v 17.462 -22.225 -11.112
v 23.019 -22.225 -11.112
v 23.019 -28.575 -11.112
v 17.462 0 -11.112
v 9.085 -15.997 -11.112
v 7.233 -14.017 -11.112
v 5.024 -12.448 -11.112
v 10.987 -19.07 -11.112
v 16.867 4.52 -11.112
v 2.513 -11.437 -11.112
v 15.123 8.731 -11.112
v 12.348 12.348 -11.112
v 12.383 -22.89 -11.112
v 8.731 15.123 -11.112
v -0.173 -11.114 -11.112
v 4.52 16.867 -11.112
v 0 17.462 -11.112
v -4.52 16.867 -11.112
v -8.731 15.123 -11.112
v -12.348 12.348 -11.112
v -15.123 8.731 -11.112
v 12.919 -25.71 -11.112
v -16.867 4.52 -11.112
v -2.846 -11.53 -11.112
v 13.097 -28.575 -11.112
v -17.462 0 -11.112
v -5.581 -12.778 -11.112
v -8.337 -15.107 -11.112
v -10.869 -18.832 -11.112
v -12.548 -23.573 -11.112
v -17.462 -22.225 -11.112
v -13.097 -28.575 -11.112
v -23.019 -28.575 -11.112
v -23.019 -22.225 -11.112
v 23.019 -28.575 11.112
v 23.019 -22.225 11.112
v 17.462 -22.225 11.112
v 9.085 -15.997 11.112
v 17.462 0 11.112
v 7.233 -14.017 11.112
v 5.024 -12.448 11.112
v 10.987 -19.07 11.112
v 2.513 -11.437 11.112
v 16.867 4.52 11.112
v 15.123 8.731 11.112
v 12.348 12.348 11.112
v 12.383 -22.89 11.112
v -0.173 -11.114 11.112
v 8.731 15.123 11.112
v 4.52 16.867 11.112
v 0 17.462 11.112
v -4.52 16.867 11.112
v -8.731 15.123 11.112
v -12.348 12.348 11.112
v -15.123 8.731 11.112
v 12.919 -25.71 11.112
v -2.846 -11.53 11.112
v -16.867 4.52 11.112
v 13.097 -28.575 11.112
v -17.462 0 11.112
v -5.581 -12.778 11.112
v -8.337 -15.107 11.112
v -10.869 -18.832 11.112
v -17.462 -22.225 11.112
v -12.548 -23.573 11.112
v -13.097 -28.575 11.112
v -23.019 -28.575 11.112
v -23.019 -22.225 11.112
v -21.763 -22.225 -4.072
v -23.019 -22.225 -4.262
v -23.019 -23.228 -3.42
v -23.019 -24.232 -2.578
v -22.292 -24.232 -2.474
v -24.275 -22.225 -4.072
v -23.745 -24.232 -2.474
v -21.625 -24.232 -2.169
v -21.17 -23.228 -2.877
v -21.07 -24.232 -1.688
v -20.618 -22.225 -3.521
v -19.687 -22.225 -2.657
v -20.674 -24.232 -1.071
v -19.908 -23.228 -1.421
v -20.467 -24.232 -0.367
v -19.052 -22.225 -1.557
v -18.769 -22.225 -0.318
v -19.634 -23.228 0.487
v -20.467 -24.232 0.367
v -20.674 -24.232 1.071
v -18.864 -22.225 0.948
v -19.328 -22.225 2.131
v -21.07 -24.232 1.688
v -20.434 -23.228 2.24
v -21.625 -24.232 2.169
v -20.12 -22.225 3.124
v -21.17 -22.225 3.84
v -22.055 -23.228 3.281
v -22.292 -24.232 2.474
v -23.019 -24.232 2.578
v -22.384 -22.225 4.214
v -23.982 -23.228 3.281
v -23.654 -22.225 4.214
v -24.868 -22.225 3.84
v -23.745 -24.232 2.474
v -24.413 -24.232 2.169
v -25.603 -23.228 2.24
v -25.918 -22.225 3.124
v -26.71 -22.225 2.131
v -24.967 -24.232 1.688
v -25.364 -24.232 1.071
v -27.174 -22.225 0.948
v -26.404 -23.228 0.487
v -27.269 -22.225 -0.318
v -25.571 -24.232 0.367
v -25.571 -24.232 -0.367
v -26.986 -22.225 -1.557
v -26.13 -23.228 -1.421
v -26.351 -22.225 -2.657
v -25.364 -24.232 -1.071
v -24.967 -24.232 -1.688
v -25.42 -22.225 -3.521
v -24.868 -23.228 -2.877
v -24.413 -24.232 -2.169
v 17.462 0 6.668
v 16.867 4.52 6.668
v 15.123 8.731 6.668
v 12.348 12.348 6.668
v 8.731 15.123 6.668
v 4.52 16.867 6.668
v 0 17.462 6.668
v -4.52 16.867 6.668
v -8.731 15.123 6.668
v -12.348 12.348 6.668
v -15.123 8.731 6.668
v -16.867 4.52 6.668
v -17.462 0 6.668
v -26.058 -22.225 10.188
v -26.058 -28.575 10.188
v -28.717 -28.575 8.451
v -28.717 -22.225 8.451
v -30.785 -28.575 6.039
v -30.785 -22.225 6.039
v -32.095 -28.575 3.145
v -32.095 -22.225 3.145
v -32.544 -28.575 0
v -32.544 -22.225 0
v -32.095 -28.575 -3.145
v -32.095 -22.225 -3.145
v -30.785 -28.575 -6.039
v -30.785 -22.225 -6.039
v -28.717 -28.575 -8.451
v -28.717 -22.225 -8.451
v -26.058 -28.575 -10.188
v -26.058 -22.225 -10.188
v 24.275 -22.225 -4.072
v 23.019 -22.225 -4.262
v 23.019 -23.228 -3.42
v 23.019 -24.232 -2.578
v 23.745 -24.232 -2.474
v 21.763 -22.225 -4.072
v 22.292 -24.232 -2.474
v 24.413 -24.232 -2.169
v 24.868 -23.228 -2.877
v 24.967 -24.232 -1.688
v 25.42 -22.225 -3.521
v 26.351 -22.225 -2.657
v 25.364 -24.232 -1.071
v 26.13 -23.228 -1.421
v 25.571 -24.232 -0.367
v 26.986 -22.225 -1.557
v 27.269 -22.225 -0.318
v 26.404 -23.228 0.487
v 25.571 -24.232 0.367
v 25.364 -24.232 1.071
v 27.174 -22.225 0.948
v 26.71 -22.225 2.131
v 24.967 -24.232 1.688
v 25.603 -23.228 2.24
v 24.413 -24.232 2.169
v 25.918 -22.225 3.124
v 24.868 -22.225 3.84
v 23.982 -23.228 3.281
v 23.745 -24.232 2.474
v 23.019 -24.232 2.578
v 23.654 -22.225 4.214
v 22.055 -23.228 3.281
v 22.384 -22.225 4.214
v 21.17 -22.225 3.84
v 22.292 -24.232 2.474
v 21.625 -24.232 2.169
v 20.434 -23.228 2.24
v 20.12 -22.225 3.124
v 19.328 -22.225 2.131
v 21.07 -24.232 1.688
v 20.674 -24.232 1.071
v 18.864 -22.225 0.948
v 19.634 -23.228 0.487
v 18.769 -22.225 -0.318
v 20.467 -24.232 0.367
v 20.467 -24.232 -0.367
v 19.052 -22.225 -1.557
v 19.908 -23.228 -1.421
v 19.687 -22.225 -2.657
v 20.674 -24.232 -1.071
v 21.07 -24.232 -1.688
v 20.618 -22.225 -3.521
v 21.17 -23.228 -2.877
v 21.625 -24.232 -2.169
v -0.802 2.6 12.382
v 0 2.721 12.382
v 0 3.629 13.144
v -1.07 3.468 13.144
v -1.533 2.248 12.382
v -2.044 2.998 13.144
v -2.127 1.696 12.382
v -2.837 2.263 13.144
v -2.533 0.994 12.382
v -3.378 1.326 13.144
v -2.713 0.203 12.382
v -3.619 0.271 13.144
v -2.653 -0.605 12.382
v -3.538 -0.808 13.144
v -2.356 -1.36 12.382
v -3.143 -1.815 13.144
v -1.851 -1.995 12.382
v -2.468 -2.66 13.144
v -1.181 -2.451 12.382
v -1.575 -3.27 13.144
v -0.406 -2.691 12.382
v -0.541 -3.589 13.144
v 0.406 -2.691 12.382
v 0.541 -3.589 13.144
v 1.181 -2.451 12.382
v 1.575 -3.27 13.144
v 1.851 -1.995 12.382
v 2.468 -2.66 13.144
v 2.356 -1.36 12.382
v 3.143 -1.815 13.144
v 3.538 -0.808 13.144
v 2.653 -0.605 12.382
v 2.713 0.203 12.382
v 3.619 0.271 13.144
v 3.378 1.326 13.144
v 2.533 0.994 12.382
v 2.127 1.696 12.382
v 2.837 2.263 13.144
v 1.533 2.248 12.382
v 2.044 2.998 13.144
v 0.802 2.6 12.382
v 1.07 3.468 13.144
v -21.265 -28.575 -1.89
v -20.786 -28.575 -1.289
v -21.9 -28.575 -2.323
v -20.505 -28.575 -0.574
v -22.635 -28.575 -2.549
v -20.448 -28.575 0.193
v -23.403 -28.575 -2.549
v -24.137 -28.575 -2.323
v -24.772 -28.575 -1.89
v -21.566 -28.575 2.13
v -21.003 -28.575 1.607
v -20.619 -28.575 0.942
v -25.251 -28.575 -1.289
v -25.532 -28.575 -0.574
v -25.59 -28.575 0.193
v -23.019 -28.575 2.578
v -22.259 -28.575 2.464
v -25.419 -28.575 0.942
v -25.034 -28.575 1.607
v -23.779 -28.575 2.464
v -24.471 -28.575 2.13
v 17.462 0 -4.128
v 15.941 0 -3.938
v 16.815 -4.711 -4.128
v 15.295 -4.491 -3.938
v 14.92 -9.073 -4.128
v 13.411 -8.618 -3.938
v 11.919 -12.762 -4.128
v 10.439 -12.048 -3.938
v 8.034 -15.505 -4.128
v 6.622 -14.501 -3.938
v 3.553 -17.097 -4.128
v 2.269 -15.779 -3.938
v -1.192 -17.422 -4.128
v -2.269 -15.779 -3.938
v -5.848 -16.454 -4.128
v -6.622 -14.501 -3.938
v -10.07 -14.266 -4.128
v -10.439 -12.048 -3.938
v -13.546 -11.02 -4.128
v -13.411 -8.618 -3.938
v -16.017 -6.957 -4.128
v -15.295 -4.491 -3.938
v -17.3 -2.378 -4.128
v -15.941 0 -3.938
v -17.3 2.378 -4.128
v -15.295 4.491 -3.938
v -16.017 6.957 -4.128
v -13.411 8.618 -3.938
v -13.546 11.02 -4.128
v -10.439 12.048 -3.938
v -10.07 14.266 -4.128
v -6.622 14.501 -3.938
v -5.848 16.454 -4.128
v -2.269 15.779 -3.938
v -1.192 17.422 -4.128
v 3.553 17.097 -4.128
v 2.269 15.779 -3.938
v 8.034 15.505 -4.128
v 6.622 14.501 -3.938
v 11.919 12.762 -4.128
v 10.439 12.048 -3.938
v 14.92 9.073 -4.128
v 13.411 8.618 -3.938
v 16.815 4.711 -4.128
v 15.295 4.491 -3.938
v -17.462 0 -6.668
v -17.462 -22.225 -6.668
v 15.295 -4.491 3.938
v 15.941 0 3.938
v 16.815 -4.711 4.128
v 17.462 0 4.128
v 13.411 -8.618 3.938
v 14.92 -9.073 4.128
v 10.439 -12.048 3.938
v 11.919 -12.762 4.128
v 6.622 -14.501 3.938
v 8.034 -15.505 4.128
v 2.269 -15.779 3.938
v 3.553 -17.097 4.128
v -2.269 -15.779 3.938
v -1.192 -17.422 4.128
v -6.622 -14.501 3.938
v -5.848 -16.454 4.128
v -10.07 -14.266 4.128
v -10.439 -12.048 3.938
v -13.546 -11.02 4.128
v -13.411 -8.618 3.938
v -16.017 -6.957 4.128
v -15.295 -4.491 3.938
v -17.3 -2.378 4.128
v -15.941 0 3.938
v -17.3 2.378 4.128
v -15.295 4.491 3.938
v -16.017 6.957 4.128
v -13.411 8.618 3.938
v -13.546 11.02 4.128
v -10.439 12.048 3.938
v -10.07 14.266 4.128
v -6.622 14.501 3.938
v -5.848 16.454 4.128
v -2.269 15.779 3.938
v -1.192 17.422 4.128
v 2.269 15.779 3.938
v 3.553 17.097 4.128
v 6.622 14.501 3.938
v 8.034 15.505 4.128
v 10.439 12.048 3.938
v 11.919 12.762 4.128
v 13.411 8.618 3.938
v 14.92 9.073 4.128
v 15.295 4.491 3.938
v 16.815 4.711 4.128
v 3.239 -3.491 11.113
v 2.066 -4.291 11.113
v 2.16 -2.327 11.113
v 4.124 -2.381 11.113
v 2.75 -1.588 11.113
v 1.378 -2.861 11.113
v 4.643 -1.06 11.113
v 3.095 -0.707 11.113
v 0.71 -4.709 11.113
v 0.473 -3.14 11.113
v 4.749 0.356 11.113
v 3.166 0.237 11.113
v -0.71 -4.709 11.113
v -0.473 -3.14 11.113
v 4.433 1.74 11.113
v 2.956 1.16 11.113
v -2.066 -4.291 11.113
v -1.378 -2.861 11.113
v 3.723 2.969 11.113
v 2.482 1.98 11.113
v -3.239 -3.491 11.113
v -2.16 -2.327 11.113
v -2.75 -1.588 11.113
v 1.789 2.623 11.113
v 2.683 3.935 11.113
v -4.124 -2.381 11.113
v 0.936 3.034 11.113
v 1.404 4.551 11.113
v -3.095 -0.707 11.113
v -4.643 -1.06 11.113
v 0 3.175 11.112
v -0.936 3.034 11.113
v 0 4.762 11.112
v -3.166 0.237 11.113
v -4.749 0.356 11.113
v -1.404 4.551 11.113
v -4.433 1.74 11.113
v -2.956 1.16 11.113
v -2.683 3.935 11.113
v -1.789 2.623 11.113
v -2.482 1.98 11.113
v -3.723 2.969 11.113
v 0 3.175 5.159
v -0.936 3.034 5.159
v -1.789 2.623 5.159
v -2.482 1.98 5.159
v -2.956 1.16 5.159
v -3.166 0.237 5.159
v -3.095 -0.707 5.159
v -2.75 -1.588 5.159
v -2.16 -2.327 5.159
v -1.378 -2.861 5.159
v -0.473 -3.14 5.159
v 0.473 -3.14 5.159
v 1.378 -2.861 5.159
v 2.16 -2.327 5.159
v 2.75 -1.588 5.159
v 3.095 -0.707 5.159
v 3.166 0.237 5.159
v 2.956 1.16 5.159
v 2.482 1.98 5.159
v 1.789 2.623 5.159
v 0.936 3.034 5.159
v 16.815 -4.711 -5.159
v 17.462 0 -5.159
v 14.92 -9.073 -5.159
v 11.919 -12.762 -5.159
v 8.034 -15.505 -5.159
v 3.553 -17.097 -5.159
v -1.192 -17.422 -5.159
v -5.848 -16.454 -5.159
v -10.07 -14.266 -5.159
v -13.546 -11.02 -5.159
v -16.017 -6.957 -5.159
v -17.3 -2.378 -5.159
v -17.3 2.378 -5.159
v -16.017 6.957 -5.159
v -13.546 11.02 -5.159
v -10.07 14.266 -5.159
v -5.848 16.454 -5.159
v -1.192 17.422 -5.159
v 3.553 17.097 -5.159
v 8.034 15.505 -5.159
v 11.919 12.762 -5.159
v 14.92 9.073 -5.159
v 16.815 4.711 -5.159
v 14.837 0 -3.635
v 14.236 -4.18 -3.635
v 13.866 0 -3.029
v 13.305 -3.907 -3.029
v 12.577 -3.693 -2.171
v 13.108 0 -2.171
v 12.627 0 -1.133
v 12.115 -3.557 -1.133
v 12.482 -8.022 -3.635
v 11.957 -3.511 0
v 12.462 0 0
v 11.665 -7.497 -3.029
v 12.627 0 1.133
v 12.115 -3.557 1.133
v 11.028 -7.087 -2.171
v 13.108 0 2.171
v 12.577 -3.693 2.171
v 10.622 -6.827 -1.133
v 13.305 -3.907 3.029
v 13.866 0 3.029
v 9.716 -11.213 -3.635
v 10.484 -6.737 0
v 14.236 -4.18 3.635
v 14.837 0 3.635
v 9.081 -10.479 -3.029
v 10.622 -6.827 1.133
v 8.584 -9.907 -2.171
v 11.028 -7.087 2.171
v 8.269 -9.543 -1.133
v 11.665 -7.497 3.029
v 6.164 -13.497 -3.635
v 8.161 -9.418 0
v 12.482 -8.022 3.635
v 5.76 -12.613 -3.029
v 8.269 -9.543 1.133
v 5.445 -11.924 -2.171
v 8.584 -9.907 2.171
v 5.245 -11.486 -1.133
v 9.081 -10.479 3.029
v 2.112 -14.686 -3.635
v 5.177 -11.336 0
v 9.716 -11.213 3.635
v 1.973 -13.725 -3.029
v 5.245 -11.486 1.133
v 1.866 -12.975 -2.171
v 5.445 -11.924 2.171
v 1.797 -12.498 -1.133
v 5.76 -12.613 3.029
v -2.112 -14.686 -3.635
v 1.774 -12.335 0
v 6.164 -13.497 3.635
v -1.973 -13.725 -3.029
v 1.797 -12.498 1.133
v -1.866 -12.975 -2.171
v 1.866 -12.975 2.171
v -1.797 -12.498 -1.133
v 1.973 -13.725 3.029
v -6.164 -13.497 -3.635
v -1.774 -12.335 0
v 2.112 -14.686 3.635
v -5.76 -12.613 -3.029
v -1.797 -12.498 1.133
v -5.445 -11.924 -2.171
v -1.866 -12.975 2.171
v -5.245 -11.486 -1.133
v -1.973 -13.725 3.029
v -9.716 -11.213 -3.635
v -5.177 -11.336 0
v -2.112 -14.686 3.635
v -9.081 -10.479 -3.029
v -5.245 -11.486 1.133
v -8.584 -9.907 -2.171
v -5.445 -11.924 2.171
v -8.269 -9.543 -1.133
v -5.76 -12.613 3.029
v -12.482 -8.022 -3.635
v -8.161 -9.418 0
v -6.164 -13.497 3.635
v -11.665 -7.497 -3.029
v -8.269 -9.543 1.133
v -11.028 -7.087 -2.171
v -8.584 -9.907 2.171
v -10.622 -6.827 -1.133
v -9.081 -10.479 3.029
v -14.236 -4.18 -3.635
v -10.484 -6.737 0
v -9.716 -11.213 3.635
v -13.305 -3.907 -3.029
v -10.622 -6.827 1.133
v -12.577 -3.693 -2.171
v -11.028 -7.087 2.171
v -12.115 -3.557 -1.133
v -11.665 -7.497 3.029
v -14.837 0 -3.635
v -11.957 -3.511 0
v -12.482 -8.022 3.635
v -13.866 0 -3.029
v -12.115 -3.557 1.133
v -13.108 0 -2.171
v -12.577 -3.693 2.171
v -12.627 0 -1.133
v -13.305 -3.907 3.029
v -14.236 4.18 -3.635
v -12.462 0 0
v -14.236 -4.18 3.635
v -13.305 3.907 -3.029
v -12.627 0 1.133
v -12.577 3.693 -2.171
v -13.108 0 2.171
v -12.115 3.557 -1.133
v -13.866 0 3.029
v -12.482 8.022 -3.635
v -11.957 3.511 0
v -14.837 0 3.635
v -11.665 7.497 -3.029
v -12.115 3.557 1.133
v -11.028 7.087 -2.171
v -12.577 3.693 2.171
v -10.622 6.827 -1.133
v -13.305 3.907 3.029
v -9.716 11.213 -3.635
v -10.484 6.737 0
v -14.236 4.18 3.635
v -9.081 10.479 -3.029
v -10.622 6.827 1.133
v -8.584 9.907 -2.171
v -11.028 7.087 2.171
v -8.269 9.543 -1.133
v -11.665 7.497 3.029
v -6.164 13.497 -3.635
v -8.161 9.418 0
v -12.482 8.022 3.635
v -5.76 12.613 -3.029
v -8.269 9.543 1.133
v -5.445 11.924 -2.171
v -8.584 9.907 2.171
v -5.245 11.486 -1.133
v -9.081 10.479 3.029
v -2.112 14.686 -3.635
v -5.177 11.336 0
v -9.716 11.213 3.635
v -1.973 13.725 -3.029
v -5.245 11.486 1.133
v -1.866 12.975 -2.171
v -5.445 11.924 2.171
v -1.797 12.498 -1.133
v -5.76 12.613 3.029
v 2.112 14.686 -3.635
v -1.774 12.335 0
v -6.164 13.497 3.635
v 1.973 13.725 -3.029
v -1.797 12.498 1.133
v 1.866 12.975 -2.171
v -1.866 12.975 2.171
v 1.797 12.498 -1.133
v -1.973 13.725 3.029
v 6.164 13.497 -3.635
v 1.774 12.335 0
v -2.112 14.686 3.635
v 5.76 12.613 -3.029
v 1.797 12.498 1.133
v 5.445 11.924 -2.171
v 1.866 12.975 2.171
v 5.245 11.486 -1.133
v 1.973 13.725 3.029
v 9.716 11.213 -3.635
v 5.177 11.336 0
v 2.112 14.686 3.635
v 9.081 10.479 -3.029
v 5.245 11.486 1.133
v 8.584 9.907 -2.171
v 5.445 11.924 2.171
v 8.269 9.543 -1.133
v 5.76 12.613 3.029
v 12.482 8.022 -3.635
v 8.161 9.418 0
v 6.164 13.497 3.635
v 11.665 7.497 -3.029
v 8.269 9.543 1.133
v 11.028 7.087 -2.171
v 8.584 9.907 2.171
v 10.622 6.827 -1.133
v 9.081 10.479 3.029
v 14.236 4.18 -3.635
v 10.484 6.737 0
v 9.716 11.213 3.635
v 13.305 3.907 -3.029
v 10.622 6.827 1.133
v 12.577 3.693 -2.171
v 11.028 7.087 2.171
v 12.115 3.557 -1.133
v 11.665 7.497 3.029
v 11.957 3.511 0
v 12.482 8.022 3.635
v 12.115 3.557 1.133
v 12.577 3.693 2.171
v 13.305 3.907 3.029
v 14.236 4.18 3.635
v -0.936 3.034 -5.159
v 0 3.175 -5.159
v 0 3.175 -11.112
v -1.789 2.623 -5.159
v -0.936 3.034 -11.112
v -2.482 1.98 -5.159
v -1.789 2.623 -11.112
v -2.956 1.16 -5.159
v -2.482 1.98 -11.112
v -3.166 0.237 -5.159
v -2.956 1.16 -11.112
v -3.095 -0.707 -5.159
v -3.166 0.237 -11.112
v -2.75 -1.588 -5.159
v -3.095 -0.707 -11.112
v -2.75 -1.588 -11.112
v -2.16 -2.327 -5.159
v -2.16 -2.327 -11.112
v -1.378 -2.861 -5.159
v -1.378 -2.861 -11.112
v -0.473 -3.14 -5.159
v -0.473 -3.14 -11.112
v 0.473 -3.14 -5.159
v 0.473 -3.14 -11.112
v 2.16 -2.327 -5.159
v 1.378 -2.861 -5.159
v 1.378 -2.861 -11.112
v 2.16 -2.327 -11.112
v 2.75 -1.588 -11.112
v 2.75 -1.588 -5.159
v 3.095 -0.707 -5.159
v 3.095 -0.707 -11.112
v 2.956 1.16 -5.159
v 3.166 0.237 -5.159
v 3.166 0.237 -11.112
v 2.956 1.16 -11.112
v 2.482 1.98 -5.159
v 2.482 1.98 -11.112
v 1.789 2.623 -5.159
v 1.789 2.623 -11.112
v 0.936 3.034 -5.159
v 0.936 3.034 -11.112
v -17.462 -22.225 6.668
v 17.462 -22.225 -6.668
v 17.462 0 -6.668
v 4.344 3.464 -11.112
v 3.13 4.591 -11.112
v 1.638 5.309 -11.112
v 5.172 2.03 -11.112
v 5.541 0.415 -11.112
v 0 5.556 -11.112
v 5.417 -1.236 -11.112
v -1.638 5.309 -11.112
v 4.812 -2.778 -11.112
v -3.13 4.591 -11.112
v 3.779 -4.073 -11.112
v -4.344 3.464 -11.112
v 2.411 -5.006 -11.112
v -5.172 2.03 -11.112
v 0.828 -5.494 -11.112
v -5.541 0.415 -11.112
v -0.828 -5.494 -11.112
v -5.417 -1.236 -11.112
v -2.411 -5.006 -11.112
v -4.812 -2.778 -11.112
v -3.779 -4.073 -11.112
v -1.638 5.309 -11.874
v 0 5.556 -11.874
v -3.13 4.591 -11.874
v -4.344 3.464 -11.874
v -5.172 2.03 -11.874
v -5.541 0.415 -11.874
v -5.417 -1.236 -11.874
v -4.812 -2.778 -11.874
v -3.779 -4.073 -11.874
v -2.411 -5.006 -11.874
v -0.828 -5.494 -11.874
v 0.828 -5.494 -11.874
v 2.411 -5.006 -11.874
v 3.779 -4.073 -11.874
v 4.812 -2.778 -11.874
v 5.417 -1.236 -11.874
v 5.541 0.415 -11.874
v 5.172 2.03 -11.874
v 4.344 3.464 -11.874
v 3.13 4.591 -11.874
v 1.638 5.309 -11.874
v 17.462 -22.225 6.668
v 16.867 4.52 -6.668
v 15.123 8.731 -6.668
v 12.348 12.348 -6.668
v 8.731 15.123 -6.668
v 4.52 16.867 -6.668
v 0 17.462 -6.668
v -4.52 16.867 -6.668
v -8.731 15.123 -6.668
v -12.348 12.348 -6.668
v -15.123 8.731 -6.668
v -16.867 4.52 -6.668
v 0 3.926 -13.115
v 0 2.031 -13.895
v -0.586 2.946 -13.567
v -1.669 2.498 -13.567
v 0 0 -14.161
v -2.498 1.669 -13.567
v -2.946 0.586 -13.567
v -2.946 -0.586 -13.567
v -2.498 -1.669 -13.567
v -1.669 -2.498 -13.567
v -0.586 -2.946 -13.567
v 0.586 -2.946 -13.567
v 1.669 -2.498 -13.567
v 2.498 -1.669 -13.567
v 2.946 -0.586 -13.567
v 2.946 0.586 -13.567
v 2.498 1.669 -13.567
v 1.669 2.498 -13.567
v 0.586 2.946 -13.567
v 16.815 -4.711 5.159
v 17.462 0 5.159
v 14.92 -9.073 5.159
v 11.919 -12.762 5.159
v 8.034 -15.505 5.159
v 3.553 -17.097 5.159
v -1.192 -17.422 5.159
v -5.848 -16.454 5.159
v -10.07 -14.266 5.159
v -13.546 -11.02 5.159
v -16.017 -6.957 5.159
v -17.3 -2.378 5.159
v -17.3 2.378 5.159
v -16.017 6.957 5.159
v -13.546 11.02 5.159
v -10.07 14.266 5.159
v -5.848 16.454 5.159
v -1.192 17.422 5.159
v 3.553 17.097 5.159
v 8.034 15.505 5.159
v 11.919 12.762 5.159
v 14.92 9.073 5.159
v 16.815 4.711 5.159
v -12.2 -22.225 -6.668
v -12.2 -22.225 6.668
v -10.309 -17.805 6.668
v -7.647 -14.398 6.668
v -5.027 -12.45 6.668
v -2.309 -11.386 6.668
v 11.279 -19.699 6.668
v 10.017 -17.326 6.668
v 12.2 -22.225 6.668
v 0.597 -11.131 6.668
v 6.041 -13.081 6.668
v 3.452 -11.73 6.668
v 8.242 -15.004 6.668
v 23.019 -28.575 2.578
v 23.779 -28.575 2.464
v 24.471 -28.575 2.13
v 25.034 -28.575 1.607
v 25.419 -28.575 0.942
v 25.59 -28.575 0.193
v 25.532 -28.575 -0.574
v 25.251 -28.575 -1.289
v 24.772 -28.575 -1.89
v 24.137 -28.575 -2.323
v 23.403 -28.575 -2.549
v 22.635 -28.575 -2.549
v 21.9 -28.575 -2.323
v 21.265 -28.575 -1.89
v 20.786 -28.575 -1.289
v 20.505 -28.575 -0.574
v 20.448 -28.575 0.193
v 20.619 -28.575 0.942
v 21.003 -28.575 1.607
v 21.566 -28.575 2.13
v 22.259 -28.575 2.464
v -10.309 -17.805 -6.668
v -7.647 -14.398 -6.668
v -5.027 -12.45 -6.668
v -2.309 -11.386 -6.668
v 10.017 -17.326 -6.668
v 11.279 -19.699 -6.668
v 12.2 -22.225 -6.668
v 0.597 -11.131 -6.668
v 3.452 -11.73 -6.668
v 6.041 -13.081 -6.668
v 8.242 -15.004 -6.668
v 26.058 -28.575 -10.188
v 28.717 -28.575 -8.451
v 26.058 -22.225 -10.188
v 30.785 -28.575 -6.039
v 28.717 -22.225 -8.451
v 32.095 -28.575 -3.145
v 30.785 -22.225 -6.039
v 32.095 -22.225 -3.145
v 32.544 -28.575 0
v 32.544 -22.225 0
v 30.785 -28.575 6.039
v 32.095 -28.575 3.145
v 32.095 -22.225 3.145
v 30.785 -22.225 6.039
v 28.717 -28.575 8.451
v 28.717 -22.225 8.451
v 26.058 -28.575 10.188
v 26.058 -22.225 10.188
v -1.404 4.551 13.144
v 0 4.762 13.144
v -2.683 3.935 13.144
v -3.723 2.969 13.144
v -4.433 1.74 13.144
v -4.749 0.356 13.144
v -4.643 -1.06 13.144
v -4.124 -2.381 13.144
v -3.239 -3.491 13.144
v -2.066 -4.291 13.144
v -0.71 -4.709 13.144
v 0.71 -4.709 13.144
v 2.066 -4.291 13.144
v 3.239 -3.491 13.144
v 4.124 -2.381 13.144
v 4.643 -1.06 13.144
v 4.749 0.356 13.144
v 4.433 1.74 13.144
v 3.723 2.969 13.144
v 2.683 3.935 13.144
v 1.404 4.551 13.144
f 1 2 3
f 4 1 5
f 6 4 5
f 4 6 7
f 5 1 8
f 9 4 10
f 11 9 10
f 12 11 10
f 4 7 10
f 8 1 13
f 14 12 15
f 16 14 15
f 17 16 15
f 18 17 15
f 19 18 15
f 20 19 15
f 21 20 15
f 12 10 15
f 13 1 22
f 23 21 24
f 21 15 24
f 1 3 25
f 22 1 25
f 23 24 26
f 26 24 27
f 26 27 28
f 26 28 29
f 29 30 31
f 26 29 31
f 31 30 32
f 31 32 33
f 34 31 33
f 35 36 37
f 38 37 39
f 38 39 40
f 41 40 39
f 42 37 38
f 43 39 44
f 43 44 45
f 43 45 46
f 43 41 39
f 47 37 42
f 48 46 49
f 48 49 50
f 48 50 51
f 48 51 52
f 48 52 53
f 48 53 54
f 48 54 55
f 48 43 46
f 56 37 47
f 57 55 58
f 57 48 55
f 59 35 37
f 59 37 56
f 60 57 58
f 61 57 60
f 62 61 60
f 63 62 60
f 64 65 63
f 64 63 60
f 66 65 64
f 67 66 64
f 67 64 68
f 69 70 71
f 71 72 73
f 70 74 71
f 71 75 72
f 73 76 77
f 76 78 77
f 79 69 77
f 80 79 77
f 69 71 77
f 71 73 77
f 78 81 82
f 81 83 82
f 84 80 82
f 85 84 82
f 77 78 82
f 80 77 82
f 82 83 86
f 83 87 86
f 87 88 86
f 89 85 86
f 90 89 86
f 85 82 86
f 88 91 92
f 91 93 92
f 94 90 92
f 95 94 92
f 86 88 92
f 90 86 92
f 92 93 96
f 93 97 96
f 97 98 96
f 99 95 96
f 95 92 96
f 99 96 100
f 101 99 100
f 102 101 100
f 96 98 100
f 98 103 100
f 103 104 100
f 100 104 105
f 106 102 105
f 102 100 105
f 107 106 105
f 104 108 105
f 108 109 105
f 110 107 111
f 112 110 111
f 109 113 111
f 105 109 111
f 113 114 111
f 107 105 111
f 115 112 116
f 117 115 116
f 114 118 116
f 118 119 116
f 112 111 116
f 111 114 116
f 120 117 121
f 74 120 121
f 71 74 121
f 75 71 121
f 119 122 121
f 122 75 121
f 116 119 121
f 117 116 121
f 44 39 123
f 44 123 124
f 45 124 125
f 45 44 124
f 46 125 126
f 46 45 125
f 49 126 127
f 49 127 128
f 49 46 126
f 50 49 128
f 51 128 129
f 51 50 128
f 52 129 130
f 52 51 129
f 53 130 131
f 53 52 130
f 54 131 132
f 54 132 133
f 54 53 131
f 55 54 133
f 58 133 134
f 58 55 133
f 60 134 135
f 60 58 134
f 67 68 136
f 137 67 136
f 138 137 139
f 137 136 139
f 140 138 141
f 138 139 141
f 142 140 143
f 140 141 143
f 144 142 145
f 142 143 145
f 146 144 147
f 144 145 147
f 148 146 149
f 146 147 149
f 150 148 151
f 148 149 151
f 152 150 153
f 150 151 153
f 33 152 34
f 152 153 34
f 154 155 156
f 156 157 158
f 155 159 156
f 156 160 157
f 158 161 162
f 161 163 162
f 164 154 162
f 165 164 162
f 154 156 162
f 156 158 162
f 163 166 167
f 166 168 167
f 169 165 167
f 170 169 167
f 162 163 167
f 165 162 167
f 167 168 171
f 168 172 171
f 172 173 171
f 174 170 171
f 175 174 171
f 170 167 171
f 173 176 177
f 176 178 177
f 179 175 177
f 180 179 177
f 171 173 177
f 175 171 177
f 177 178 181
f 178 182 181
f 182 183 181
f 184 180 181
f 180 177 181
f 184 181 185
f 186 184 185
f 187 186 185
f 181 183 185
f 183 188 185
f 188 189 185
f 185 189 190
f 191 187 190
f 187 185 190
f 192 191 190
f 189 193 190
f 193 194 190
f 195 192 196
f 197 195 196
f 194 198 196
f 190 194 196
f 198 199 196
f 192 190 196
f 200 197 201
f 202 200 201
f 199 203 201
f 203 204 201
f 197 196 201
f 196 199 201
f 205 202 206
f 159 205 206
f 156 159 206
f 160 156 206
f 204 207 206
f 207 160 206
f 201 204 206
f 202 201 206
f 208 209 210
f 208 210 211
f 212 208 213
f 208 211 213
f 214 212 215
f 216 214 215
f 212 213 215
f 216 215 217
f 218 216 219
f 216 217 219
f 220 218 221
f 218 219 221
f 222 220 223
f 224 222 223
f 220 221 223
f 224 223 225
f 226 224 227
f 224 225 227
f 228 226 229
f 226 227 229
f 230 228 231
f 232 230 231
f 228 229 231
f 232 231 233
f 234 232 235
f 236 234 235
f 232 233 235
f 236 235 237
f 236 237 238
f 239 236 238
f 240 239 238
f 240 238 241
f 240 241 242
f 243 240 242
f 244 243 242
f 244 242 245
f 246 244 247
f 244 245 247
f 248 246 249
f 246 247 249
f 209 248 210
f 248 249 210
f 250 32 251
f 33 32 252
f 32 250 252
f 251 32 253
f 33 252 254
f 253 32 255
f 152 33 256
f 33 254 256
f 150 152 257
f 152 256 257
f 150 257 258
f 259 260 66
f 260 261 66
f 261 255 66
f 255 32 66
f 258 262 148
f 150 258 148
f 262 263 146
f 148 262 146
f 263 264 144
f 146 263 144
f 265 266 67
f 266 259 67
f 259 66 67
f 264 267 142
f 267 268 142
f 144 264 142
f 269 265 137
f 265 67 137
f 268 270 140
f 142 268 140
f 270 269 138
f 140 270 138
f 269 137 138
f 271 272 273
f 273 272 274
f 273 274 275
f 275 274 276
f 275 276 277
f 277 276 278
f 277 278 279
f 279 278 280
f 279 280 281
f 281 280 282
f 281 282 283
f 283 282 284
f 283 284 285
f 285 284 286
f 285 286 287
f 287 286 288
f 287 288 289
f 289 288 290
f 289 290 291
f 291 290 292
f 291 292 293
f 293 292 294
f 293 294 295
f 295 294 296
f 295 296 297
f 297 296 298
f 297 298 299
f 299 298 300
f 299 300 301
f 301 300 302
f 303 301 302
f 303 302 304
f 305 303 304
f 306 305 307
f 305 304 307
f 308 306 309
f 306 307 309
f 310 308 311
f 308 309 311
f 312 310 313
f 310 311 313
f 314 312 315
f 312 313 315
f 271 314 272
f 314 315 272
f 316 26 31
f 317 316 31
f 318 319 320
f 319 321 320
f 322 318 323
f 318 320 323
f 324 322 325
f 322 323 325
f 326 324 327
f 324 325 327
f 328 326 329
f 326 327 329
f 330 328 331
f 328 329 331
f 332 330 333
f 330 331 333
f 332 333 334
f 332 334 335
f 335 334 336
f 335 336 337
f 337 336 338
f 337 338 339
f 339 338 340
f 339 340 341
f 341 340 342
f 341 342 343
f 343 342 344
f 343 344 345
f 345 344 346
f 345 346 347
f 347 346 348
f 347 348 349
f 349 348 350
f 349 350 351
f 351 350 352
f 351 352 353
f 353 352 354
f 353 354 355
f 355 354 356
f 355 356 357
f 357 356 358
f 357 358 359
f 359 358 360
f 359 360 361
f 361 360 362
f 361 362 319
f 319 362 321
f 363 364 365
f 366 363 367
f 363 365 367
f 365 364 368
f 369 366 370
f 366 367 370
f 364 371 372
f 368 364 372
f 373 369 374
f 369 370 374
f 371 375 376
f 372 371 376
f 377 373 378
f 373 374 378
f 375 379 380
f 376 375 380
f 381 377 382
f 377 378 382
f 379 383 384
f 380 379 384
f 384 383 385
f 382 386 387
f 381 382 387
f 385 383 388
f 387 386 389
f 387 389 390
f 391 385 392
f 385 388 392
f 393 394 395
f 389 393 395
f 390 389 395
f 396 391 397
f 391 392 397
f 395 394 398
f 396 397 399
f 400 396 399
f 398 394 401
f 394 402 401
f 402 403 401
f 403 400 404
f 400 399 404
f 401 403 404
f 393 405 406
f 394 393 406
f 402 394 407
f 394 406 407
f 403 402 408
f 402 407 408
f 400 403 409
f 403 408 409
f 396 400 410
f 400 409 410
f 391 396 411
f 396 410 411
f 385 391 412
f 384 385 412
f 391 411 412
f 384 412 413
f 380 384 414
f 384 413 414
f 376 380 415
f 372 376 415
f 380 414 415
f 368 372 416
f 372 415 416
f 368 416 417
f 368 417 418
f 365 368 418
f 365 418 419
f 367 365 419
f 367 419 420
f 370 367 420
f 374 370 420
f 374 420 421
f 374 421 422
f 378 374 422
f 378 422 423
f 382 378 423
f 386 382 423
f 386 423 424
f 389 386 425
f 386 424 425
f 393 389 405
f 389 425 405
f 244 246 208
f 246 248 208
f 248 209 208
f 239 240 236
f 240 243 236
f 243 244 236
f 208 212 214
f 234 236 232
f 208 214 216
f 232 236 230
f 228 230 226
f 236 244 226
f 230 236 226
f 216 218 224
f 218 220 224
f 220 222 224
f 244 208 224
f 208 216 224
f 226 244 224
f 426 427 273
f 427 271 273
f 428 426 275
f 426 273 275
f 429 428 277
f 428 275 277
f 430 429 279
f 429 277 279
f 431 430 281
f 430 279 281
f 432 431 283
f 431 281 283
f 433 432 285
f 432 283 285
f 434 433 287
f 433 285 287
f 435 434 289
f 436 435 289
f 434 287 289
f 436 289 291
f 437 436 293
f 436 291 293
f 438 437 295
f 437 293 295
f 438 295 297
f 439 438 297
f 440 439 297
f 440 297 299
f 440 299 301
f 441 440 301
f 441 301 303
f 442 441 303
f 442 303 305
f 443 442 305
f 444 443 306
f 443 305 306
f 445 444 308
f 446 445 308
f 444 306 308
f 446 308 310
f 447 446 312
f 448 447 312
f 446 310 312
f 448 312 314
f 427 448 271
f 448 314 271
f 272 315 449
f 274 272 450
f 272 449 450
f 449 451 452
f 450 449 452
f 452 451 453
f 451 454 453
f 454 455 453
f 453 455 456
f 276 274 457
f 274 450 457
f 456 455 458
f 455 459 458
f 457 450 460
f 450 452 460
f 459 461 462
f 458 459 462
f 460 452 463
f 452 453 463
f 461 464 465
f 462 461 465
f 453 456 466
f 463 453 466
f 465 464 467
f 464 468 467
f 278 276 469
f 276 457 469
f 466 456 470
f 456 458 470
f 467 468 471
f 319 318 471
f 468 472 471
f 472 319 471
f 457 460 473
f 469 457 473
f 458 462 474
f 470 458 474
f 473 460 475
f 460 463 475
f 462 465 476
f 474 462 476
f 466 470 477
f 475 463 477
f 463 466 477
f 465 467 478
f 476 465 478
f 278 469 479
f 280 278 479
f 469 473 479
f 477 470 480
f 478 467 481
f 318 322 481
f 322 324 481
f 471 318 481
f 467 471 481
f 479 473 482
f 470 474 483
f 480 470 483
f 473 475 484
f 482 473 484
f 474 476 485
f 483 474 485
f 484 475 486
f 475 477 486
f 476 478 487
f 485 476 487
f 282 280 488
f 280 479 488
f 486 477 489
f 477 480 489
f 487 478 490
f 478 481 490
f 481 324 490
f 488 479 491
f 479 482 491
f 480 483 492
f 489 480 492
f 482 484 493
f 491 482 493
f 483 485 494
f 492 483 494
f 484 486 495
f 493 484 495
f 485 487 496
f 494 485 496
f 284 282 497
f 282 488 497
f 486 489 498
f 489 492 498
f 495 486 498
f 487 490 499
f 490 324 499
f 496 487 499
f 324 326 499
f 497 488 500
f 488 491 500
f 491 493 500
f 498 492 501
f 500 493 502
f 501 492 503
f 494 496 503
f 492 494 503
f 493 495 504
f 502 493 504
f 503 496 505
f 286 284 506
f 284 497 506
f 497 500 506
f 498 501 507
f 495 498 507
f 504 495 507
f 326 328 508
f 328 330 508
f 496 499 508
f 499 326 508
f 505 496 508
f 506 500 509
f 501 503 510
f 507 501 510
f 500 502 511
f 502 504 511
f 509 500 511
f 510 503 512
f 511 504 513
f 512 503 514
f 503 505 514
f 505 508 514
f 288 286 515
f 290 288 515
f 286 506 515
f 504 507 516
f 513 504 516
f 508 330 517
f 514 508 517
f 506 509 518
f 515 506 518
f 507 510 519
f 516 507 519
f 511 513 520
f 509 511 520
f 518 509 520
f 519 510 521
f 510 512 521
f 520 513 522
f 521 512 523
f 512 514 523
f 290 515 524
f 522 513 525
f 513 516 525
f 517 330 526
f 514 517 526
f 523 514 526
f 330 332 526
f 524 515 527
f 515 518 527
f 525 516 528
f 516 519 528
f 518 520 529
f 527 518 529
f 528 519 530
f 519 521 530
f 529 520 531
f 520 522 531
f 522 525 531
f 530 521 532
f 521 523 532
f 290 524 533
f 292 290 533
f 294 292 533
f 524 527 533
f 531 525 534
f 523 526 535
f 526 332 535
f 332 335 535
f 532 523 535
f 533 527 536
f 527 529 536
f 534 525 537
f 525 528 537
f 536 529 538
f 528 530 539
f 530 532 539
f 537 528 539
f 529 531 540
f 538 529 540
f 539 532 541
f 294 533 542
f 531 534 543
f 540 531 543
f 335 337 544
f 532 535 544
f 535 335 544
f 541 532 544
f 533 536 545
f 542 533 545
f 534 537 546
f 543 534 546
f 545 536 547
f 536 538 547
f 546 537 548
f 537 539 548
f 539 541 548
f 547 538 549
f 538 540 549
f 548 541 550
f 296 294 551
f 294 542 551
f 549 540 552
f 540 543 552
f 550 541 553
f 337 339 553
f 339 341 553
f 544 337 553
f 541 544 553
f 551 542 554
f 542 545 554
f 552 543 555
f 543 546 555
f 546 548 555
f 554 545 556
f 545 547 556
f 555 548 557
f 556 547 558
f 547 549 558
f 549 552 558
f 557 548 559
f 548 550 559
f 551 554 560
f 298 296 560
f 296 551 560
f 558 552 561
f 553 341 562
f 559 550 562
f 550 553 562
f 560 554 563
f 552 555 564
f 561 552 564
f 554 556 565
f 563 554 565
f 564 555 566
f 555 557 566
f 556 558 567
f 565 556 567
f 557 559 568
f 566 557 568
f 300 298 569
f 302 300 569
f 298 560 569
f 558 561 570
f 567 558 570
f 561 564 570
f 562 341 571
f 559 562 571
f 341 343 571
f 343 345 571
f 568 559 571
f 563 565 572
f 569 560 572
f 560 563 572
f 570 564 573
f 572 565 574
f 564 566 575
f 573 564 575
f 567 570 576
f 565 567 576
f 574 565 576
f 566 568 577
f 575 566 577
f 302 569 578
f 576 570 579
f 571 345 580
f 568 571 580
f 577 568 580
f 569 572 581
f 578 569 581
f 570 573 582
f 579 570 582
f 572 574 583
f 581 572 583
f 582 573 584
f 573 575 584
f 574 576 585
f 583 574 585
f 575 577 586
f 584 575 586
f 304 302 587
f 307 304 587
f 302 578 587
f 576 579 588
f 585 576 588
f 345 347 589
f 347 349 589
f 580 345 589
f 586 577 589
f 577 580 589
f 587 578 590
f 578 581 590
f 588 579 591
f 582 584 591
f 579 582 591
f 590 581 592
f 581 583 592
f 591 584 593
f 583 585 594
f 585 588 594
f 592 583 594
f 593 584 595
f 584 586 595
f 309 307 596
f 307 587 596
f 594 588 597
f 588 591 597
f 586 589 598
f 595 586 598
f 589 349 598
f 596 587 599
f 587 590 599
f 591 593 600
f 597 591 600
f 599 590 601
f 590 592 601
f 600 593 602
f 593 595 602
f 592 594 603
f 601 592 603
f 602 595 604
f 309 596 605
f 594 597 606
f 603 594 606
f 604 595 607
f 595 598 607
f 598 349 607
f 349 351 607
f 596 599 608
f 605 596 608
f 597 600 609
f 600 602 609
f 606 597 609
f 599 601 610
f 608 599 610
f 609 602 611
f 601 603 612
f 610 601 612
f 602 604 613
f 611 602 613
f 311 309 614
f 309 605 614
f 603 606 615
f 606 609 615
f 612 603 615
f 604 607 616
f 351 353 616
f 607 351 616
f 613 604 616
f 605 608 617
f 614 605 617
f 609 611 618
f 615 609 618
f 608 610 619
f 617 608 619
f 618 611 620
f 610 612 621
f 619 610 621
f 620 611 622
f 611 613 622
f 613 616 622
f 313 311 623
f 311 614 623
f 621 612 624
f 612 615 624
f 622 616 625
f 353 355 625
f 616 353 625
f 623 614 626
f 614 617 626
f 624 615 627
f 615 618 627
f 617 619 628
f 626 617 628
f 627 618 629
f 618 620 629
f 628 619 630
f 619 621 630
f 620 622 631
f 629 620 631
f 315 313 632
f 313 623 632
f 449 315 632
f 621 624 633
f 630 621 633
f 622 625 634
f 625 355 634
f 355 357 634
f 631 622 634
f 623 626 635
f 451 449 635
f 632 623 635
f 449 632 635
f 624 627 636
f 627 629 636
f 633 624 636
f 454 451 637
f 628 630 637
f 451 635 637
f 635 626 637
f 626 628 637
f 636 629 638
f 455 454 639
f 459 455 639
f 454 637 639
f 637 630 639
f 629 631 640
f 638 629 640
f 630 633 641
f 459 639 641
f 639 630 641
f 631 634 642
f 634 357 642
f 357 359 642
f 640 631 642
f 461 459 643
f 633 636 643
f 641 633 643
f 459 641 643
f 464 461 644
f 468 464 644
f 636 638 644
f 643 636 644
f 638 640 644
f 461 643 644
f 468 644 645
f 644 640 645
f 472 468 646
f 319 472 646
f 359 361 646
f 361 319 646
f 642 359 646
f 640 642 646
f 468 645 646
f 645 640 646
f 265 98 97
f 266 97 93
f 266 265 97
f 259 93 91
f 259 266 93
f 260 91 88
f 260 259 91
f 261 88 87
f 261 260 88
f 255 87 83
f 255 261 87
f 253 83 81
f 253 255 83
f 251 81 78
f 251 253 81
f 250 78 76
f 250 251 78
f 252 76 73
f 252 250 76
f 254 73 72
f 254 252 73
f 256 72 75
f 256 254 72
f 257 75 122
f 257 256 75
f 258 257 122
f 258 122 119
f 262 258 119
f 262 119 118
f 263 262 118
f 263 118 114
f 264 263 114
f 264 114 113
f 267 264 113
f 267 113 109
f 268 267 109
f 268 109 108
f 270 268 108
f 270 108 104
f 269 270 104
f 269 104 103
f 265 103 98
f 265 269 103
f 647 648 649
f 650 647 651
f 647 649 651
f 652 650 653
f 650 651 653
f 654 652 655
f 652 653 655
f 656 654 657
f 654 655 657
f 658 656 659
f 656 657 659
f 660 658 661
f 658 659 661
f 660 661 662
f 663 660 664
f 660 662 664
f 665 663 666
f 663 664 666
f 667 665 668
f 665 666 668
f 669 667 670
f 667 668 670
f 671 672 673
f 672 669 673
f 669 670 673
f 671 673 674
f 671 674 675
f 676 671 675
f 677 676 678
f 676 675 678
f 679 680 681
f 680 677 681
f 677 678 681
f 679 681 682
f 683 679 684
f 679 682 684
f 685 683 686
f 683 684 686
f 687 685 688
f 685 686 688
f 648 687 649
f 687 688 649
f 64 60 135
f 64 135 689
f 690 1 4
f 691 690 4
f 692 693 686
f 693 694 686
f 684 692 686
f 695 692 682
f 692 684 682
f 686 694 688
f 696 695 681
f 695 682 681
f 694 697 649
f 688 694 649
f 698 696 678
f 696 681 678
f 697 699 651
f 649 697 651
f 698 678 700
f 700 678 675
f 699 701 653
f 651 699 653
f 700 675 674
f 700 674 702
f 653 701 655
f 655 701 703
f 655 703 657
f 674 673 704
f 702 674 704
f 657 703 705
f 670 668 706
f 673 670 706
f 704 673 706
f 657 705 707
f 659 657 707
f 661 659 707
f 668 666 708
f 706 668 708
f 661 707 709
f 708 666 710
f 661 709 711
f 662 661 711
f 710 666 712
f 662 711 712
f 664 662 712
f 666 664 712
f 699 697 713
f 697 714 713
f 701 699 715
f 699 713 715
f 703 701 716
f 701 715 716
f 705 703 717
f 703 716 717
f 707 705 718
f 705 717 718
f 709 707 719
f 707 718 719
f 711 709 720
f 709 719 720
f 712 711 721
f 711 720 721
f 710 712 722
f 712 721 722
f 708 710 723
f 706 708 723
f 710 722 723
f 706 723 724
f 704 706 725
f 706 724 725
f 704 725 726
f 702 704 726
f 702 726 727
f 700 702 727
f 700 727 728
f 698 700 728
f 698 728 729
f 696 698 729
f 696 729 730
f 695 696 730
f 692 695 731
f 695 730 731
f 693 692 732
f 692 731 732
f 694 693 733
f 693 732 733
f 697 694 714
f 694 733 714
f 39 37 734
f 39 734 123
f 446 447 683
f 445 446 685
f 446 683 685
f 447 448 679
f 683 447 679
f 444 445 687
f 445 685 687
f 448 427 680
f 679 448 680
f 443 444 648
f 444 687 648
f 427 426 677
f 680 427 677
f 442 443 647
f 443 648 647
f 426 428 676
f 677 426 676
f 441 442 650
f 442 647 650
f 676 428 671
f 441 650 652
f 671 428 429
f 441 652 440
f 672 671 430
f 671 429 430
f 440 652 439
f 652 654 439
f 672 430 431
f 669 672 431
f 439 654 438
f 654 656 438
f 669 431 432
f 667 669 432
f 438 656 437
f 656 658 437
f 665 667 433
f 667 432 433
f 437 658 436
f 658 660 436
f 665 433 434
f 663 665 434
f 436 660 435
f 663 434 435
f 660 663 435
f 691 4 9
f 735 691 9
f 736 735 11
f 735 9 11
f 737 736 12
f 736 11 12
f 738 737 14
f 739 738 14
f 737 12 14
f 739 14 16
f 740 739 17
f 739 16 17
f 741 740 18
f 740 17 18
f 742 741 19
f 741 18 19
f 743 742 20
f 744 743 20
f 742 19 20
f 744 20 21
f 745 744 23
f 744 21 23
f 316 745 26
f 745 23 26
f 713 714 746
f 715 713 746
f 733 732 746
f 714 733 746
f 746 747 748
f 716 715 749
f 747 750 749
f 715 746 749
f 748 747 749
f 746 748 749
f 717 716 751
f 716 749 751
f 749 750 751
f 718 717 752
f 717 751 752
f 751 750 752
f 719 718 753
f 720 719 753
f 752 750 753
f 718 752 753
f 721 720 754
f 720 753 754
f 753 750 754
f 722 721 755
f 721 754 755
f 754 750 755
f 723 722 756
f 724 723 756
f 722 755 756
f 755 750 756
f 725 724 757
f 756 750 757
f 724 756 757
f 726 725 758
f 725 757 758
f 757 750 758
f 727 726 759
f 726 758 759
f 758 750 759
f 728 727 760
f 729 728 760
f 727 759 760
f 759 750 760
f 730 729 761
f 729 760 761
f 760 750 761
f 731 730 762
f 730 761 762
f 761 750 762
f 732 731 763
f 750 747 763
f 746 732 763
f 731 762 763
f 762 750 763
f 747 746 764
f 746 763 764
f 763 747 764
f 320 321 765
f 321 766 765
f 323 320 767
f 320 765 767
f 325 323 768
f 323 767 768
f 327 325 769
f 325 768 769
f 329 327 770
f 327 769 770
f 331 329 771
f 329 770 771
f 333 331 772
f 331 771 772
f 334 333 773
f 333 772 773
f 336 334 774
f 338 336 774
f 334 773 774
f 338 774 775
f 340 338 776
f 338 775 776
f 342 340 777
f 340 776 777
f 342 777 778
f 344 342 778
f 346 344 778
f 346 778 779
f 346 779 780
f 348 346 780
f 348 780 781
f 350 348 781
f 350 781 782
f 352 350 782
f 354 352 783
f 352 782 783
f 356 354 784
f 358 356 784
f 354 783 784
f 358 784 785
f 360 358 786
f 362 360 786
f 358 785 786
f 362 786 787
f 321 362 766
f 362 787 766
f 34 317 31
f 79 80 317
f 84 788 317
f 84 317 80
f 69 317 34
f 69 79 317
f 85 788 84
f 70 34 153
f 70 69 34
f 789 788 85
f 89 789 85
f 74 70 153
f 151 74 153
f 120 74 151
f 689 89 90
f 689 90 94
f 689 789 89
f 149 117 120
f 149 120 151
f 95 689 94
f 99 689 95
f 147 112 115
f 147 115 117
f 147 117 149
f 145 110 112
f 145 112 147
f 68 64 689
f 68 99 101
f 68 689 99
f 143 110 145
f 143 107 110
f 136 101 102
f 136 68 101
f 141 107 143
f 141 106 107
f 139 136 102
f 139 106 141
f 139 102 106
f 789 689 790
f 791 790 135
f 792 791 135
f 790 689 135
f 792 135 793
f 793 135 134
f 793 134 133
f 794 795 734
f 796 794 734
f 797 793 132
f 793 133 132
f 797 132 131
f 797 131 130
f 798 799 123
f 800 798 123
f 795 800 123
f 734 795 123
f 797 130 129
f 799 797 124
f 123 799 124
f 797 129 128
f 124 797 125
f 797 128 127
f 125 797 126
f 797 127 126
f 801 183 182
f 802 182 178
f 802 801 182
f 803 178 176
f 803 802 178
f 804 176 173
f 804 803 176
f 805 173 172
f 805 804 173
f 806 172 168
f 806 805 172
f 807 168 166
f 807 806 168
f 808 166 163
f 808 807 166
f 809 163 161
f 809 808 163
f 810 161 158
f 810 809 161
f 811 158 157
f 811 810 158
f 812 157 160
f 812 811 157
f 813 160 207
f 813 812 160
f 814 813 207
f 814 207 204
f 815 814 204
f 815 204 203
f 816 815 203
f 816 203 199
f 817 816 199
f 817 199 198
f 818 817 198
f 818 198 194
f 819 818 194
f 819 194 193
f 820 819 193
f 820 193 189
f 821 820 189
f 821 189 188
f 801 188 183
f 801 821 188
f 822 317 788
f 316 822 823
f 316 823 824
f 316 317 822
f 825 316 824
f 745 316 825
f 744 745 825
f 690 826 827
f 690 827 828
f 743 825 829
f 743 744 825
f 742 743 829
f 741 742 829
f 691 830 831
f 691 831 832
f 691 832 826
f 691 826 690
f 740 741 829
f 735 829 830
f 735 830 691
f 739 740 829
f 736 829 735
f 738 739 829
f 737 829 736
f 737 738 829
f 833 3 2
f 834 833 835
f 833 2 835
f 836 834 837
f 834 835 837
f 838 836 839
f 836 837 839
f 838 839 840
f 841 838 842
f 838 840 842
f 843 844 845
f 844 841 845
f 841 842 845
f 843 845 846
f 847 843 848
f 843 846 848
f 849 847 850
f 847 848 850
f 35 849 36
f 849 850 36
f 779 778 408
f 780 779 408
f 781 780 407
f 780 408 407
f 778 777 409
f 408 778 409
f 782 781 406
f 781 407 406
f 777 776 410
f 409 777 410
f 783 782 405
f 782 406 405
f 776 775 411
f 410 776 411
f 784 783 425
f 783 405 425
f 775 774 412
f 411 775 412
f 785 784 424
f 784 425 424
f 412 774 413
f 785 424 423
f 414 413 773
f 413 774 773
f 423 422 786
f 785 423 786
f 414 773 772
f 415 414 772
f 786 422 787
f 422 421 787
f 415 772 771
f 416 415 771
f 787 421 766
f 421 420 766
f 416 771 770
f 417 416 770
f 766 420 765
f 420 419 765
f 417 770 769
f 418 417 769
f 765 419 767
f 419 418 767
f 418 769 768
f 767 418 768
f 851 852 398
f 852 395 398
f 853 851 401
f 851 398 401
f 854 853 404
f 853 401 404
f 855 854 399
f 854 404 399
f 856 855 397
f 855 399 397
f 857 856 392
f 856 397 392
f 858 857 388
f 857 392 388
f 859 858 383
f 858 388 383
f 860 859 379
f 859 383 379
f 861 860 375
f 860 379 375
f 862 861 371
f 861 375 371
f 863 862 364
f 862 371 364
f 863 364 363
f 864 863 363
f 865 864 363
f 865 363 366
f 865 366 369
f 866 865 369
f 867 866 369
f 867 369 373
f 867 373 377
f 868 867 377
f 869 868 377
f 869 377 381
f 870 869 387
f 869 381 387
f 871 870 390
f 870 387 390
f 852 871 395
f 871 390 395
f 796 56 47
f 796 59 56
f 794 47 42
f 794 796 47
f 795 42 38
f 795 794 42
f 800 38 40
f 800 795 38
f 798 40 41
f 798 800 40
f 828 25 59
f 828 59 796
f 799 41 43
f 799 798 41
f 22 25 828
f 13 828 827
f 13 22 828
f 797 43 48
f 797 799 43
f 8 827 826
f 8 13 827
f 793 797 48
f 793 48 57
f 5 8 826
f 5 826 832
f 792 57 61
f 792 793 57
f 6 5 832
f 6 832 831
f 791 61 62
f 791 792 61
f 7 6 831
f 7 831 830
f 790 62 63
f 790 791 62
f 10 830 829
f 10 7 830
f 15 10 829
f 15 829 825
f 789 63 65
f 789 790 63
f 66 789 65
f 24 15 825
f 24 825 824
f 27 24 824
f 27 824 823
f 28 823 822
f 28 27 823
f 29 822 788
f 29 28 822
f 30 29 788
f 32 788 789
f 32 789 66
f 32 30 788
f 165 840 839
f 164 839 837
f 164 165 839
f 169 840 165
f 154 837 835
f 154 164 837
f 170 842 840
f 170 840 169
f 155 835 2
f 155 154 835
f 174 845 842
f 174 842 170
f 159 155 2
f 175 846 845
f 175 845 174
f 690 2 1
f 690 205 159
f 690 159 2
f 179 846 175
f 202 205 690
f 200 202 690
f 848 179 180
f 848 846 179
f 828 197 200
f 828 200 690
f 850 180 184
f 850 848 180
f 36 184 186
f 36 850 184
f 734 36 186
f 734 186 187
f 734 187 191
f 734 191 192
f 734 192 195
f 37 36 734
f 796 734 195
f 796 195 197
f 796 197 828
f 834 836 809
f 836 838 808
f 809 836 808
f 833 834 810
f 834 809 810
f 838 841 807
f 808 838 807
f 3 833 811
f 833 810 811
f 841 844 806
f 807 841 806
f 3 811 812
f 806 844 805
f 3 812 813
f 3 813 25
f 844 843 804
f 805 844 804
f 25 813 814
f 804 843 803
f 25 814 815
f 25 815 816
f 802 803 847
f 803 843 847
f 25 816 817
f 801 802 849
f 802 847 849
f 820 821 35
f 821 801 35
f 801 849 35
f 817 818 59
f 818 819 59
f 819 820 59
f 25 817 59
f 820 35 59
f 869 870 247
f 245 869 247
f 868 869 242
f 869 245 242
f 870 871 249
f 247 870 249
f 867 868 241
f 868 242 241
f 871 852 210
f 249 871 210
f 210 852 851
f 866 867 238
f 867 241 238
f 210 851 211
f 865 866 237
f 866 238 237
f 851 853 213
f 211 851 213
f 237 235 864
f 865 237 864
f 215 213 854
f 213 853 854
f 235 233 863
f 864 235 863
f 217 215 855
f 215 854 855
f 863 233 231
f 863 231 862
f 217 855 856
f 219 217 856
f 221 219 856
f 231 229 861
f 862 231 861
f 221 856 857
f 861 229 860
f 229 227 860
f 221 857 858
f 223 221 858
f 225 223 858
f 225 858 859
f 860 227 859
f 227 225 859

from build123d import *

# Parameters (mm, degrees)
SKETCH4_W                    = 65.0875
SKETCH4_H                    = 22.225
SKETCH4_R                    = 2.5781
BOSS_EXTRUDE1_DEPTH          = 6.35
SKETCH8_R                    = 2.5781
CUT_EXTRUDE2_DEPTH           = 2.0066
CUT_EXTRUDE2_DRAFT           = 40
CUT_EXTRUDE2_PROFILE_2_DEPTH = 2.0066
CUT_EXTRUDE2_PROFILE_2_DRAFT = 40
BOSS_EXTRUDE2_DEPTH          = 4.445
CUT_EXTRUDE1_DEPTH           = 46.564745685
CUT_EXTRUDE3_DEPTH           = 46.564745685
CUT_EXTRUDE3_DEPTH_BACK      = 46.564745685
SKETCH10_RX                  = 17.4625
SKETCH10_RY                  = 13.096875


with BuildPart() as part:
    # Sketch3 → Revolve1 (revolve)
    with BuildSketch(Plane(origin=(0, 0, 0), x_dir=(0, 0, -1), z_dir=(1, 0, 0)), mode=Mode.PRIVATE) as revolve1_sk:
        with BuildLine():
            Line((-5.159375, 17.4625), (-5.159375, 0))
            Line((-5.159375, 0), (5.159375, 0))
            Line((5.159375, 0), (5.159375, 17.4625))
            Line((5.159375, 17.4625), (4.1275, 17.4625))
            Line((4.1275, 17.4625), (3.938458344, 15.941214703))
            ThreePointArc((3.938458344, 15.941214703), (0, 12.461875), (-3.938458344, 15.941214703))
            Line((-3.938458344, 15.941214703), (-4.1275, 17.4625))
            Line((-4.1275, 17.4625), (-5.159375, 17.4625))
        make_face()
    revolve(revolve1_sk.sketch.rotate(Axis((0, 0, 5.159375), (0, 0, -1)), 90), axis=Axis((0, 0, 5.159375), (0, 0, -1)))

    # Sketch6 → Revolve2 (revolve)
    with BuildSketch(Plane(origin=(0, 0, 0), x_dir=(0, 0, -1), z_dir=(1, 0, 0))):
        with BuildLine():
            Line((-11.1125, 3.175), (11.1125, 3.175))
            Line((11.1125, 3.175), (11.1125, 5.55625))
            Line((11.1125, 5.55625), (11.8745, 5.55625))
            ThreePointArc((11.8745, 5.55625), (13.566668214, 3.004068494), (14.1605, 0))
            Line((14.1605, 0), (-12.3825, 0))
            Line((-12.3825, 0), (-12.3825, 2.720941881))
            Line((-12.3825, 2.720941881), (-13.1445, 3.629058119))
            Line((-13.1445, 3.629058119), (-13.1445, 4.7625))
            Line((-13.1445, 4.7625), (-11.1125, 4.7625))
            Line((-11.1125, 4.7625), (-11.1125, 3.175))
        make_face()
    revolve(axis=Axis((0, 0, -14.1605), (0, 0, 1)))


with BuildPart() as body_2:
    # Sketch4 → Boss-Extrude1 (new body)
    with BuildSketch(Plane(origin=(0, -28.575, 0), x_dir=(-1, 0, 0), z_dir=(0, 1, 0))):
        Rectangle(SKETCH4_W, SKETCH4_H)
        with Locations(Location((23.01875, 0, 0), (0, 0, 90))):
            Circle(SKETCH4_R, mode=Mode.SUBTRACT)
        with Locations(Location((-23.01875, 0, 0), (0, 0, 90))):
            Circle(SKETCH4_R, mode=Mode.SUBTRACT)
    extrude(amount=BOSS_EXTRUDE1_DEPTH)


with BuildPart() as cut_extrude2_tool:
    # Sketch8 → Cut-Extrude2 (with draft: the straight prism first)
    with BuildSketch(Plane.XZ.offset(24.2316)):
        with Locations(Location((23.01875, 0, 0), (0, 0, 270))):
            Circle(SKETCH8_R)
    extrude(amount=-CUT_EXTRUDE2_DEPTH)
    # Cut-Extrude2: the draft: its side faces are tilted about the plane it starts from
    cut_extrude2_sides = [cut_extrude2_tool.faces().sort_by_distance(p)[0] for p in [
        (23.01875, -23.2283, 2.5781),
    ]]
    draft(cut_extrude2_sides, Plane.XZ.offset(24.2316), CUT_EXTRUDE2_DRAFT)


with BuildPart() as body_2_1:
    add(body_2.part)

    # Cut-Extrude2: cut by cut_extrude2_tool
    add(cut_extrude2_tool.part, mode=Mode.SUBTRACT)


with BuildPart() as cut_extrude2_profile_2_tool:
    # Sketch8 → Cut-Extrude2 profile 2 (with draft: the straight prism first)
    with BuildSketch(Plane.XZ.offset(24.2316)):
        with Locations(Location((-23.01875, 0, 0), (0, 0, 270))):
            Circle(SKETCH8_R)
    extrude(amount=-CUT_EXTRUDE2_PROFILE_2_DEPTH)
    # Cut-Extrude2 profile 2: the draft: its side faces are tilted about the plane it starts from
    cut_extrude2_profile_2_sides = [cut_extrude2_profile_2_tool.faces().sort_by_distance(p)[0] for p in [
        (-23.01875, -23.2283, 2.5781),
    ]]
    draft(cut_extrude2_profile_2_sides, Plane.XZ.offset(24.2316), CUT_EXTRUDE2_PROFILE_2_DRAFT)


with BuildPart() as body_2_2:
    add(body_2_1.part)

    # Cut-Extrude2 profile 2: cut by cut_extrude2_profile_2_tool
    add(cut_extrude2_profile_2_tool.part, mode=Mode.SUBTRACT)

    # Sketch5 → Boss-Extrude2 (add)
    with BuildSketch(Plane.XY.offset(11.1125)):
        with BuildLine():
            Line((-17.4625, 0), (-17.4625, -22.225))
            Line((-17.4625, -22.225), (17.4625, -22.225))
            Line((17.4625, -22.225), (17.4625, 0))
            ThreePointArc((17.4625, 0), (0, 17.4625), (-17.4625, 0))
        make_face()
    boss_extrude2 = extrude(amount=-BOSS_EXTRUDE2_DEPTH)

    # Mirror1: Boss-Extrude2 across plane
    add(boss_extrude2.mirror(Plane.XY))

    # Sketch7 → Cut-Extrude1 (cut, through all)
    with BuildSketch(Plane(origin=(0, 0, 0), x_dir=(1, 0, 0), z_dir=(0, 1, 0))):
        with BuildLine():
            Line((-23.01875, 11.1125), (-23.01875, 11.7475))
            Line((-23.01875, 11.7475), (-33.17875, 11.7475))
            Line((-33.17875, 11.7475), (-33.17875, -11.7475))
            Line((-33.17875, -11.7475), (-23.01875, -11.7475))
            Line((-23.01875, -11.7475), (-23.01875, -11.1125))
            ThreePointArc((-23.01875, -11.1125), (-32.54375, 0), (-23.01875, 11.1125))
        make_face()
        with BuildLine():
            Line((23.01875, -11.7475), (33.17875, -11.7475))
            Line((33.17875, -11.7475), (33.17875, 11.7475))
            Line((33.17875, 11.7475), (23.01875, 11.7475))
            Line((23.01875, 11.7475), (23.01875, 11.1125))
            ThreePointArc((23.01875, 11.1125), (32.54375, 0), (23.01875, -11.1125))
            Line((23.01875, -11.1125), (23.01875, -11.7475))
        make_face()
    extrude(amount=-CUT_EXTRUDE1_DEPTH, mode=Mode.SUBTRACT)

    # Sketch10 → Cut-Extrude3 (cut, two sides: drawn at the far end of the back side and taken through both)
    with BuildSketch(Plane.XY.offset(-CUT_EXTRUDE3_DEPTH_BACK)):
        with Locations(Location((0, -28.575), (0, 0, -90))):
            Ellipse(SKETCH10_RX, SKETCH10_RY)
    extrude(amount=CUT_EXTRUDE3_DEPTH + CUT_EXTRUDE3_DEPTH_BACK, mode=Mode.SUBTRACT)


solid = Compound([part.part, body_2_2.part])
